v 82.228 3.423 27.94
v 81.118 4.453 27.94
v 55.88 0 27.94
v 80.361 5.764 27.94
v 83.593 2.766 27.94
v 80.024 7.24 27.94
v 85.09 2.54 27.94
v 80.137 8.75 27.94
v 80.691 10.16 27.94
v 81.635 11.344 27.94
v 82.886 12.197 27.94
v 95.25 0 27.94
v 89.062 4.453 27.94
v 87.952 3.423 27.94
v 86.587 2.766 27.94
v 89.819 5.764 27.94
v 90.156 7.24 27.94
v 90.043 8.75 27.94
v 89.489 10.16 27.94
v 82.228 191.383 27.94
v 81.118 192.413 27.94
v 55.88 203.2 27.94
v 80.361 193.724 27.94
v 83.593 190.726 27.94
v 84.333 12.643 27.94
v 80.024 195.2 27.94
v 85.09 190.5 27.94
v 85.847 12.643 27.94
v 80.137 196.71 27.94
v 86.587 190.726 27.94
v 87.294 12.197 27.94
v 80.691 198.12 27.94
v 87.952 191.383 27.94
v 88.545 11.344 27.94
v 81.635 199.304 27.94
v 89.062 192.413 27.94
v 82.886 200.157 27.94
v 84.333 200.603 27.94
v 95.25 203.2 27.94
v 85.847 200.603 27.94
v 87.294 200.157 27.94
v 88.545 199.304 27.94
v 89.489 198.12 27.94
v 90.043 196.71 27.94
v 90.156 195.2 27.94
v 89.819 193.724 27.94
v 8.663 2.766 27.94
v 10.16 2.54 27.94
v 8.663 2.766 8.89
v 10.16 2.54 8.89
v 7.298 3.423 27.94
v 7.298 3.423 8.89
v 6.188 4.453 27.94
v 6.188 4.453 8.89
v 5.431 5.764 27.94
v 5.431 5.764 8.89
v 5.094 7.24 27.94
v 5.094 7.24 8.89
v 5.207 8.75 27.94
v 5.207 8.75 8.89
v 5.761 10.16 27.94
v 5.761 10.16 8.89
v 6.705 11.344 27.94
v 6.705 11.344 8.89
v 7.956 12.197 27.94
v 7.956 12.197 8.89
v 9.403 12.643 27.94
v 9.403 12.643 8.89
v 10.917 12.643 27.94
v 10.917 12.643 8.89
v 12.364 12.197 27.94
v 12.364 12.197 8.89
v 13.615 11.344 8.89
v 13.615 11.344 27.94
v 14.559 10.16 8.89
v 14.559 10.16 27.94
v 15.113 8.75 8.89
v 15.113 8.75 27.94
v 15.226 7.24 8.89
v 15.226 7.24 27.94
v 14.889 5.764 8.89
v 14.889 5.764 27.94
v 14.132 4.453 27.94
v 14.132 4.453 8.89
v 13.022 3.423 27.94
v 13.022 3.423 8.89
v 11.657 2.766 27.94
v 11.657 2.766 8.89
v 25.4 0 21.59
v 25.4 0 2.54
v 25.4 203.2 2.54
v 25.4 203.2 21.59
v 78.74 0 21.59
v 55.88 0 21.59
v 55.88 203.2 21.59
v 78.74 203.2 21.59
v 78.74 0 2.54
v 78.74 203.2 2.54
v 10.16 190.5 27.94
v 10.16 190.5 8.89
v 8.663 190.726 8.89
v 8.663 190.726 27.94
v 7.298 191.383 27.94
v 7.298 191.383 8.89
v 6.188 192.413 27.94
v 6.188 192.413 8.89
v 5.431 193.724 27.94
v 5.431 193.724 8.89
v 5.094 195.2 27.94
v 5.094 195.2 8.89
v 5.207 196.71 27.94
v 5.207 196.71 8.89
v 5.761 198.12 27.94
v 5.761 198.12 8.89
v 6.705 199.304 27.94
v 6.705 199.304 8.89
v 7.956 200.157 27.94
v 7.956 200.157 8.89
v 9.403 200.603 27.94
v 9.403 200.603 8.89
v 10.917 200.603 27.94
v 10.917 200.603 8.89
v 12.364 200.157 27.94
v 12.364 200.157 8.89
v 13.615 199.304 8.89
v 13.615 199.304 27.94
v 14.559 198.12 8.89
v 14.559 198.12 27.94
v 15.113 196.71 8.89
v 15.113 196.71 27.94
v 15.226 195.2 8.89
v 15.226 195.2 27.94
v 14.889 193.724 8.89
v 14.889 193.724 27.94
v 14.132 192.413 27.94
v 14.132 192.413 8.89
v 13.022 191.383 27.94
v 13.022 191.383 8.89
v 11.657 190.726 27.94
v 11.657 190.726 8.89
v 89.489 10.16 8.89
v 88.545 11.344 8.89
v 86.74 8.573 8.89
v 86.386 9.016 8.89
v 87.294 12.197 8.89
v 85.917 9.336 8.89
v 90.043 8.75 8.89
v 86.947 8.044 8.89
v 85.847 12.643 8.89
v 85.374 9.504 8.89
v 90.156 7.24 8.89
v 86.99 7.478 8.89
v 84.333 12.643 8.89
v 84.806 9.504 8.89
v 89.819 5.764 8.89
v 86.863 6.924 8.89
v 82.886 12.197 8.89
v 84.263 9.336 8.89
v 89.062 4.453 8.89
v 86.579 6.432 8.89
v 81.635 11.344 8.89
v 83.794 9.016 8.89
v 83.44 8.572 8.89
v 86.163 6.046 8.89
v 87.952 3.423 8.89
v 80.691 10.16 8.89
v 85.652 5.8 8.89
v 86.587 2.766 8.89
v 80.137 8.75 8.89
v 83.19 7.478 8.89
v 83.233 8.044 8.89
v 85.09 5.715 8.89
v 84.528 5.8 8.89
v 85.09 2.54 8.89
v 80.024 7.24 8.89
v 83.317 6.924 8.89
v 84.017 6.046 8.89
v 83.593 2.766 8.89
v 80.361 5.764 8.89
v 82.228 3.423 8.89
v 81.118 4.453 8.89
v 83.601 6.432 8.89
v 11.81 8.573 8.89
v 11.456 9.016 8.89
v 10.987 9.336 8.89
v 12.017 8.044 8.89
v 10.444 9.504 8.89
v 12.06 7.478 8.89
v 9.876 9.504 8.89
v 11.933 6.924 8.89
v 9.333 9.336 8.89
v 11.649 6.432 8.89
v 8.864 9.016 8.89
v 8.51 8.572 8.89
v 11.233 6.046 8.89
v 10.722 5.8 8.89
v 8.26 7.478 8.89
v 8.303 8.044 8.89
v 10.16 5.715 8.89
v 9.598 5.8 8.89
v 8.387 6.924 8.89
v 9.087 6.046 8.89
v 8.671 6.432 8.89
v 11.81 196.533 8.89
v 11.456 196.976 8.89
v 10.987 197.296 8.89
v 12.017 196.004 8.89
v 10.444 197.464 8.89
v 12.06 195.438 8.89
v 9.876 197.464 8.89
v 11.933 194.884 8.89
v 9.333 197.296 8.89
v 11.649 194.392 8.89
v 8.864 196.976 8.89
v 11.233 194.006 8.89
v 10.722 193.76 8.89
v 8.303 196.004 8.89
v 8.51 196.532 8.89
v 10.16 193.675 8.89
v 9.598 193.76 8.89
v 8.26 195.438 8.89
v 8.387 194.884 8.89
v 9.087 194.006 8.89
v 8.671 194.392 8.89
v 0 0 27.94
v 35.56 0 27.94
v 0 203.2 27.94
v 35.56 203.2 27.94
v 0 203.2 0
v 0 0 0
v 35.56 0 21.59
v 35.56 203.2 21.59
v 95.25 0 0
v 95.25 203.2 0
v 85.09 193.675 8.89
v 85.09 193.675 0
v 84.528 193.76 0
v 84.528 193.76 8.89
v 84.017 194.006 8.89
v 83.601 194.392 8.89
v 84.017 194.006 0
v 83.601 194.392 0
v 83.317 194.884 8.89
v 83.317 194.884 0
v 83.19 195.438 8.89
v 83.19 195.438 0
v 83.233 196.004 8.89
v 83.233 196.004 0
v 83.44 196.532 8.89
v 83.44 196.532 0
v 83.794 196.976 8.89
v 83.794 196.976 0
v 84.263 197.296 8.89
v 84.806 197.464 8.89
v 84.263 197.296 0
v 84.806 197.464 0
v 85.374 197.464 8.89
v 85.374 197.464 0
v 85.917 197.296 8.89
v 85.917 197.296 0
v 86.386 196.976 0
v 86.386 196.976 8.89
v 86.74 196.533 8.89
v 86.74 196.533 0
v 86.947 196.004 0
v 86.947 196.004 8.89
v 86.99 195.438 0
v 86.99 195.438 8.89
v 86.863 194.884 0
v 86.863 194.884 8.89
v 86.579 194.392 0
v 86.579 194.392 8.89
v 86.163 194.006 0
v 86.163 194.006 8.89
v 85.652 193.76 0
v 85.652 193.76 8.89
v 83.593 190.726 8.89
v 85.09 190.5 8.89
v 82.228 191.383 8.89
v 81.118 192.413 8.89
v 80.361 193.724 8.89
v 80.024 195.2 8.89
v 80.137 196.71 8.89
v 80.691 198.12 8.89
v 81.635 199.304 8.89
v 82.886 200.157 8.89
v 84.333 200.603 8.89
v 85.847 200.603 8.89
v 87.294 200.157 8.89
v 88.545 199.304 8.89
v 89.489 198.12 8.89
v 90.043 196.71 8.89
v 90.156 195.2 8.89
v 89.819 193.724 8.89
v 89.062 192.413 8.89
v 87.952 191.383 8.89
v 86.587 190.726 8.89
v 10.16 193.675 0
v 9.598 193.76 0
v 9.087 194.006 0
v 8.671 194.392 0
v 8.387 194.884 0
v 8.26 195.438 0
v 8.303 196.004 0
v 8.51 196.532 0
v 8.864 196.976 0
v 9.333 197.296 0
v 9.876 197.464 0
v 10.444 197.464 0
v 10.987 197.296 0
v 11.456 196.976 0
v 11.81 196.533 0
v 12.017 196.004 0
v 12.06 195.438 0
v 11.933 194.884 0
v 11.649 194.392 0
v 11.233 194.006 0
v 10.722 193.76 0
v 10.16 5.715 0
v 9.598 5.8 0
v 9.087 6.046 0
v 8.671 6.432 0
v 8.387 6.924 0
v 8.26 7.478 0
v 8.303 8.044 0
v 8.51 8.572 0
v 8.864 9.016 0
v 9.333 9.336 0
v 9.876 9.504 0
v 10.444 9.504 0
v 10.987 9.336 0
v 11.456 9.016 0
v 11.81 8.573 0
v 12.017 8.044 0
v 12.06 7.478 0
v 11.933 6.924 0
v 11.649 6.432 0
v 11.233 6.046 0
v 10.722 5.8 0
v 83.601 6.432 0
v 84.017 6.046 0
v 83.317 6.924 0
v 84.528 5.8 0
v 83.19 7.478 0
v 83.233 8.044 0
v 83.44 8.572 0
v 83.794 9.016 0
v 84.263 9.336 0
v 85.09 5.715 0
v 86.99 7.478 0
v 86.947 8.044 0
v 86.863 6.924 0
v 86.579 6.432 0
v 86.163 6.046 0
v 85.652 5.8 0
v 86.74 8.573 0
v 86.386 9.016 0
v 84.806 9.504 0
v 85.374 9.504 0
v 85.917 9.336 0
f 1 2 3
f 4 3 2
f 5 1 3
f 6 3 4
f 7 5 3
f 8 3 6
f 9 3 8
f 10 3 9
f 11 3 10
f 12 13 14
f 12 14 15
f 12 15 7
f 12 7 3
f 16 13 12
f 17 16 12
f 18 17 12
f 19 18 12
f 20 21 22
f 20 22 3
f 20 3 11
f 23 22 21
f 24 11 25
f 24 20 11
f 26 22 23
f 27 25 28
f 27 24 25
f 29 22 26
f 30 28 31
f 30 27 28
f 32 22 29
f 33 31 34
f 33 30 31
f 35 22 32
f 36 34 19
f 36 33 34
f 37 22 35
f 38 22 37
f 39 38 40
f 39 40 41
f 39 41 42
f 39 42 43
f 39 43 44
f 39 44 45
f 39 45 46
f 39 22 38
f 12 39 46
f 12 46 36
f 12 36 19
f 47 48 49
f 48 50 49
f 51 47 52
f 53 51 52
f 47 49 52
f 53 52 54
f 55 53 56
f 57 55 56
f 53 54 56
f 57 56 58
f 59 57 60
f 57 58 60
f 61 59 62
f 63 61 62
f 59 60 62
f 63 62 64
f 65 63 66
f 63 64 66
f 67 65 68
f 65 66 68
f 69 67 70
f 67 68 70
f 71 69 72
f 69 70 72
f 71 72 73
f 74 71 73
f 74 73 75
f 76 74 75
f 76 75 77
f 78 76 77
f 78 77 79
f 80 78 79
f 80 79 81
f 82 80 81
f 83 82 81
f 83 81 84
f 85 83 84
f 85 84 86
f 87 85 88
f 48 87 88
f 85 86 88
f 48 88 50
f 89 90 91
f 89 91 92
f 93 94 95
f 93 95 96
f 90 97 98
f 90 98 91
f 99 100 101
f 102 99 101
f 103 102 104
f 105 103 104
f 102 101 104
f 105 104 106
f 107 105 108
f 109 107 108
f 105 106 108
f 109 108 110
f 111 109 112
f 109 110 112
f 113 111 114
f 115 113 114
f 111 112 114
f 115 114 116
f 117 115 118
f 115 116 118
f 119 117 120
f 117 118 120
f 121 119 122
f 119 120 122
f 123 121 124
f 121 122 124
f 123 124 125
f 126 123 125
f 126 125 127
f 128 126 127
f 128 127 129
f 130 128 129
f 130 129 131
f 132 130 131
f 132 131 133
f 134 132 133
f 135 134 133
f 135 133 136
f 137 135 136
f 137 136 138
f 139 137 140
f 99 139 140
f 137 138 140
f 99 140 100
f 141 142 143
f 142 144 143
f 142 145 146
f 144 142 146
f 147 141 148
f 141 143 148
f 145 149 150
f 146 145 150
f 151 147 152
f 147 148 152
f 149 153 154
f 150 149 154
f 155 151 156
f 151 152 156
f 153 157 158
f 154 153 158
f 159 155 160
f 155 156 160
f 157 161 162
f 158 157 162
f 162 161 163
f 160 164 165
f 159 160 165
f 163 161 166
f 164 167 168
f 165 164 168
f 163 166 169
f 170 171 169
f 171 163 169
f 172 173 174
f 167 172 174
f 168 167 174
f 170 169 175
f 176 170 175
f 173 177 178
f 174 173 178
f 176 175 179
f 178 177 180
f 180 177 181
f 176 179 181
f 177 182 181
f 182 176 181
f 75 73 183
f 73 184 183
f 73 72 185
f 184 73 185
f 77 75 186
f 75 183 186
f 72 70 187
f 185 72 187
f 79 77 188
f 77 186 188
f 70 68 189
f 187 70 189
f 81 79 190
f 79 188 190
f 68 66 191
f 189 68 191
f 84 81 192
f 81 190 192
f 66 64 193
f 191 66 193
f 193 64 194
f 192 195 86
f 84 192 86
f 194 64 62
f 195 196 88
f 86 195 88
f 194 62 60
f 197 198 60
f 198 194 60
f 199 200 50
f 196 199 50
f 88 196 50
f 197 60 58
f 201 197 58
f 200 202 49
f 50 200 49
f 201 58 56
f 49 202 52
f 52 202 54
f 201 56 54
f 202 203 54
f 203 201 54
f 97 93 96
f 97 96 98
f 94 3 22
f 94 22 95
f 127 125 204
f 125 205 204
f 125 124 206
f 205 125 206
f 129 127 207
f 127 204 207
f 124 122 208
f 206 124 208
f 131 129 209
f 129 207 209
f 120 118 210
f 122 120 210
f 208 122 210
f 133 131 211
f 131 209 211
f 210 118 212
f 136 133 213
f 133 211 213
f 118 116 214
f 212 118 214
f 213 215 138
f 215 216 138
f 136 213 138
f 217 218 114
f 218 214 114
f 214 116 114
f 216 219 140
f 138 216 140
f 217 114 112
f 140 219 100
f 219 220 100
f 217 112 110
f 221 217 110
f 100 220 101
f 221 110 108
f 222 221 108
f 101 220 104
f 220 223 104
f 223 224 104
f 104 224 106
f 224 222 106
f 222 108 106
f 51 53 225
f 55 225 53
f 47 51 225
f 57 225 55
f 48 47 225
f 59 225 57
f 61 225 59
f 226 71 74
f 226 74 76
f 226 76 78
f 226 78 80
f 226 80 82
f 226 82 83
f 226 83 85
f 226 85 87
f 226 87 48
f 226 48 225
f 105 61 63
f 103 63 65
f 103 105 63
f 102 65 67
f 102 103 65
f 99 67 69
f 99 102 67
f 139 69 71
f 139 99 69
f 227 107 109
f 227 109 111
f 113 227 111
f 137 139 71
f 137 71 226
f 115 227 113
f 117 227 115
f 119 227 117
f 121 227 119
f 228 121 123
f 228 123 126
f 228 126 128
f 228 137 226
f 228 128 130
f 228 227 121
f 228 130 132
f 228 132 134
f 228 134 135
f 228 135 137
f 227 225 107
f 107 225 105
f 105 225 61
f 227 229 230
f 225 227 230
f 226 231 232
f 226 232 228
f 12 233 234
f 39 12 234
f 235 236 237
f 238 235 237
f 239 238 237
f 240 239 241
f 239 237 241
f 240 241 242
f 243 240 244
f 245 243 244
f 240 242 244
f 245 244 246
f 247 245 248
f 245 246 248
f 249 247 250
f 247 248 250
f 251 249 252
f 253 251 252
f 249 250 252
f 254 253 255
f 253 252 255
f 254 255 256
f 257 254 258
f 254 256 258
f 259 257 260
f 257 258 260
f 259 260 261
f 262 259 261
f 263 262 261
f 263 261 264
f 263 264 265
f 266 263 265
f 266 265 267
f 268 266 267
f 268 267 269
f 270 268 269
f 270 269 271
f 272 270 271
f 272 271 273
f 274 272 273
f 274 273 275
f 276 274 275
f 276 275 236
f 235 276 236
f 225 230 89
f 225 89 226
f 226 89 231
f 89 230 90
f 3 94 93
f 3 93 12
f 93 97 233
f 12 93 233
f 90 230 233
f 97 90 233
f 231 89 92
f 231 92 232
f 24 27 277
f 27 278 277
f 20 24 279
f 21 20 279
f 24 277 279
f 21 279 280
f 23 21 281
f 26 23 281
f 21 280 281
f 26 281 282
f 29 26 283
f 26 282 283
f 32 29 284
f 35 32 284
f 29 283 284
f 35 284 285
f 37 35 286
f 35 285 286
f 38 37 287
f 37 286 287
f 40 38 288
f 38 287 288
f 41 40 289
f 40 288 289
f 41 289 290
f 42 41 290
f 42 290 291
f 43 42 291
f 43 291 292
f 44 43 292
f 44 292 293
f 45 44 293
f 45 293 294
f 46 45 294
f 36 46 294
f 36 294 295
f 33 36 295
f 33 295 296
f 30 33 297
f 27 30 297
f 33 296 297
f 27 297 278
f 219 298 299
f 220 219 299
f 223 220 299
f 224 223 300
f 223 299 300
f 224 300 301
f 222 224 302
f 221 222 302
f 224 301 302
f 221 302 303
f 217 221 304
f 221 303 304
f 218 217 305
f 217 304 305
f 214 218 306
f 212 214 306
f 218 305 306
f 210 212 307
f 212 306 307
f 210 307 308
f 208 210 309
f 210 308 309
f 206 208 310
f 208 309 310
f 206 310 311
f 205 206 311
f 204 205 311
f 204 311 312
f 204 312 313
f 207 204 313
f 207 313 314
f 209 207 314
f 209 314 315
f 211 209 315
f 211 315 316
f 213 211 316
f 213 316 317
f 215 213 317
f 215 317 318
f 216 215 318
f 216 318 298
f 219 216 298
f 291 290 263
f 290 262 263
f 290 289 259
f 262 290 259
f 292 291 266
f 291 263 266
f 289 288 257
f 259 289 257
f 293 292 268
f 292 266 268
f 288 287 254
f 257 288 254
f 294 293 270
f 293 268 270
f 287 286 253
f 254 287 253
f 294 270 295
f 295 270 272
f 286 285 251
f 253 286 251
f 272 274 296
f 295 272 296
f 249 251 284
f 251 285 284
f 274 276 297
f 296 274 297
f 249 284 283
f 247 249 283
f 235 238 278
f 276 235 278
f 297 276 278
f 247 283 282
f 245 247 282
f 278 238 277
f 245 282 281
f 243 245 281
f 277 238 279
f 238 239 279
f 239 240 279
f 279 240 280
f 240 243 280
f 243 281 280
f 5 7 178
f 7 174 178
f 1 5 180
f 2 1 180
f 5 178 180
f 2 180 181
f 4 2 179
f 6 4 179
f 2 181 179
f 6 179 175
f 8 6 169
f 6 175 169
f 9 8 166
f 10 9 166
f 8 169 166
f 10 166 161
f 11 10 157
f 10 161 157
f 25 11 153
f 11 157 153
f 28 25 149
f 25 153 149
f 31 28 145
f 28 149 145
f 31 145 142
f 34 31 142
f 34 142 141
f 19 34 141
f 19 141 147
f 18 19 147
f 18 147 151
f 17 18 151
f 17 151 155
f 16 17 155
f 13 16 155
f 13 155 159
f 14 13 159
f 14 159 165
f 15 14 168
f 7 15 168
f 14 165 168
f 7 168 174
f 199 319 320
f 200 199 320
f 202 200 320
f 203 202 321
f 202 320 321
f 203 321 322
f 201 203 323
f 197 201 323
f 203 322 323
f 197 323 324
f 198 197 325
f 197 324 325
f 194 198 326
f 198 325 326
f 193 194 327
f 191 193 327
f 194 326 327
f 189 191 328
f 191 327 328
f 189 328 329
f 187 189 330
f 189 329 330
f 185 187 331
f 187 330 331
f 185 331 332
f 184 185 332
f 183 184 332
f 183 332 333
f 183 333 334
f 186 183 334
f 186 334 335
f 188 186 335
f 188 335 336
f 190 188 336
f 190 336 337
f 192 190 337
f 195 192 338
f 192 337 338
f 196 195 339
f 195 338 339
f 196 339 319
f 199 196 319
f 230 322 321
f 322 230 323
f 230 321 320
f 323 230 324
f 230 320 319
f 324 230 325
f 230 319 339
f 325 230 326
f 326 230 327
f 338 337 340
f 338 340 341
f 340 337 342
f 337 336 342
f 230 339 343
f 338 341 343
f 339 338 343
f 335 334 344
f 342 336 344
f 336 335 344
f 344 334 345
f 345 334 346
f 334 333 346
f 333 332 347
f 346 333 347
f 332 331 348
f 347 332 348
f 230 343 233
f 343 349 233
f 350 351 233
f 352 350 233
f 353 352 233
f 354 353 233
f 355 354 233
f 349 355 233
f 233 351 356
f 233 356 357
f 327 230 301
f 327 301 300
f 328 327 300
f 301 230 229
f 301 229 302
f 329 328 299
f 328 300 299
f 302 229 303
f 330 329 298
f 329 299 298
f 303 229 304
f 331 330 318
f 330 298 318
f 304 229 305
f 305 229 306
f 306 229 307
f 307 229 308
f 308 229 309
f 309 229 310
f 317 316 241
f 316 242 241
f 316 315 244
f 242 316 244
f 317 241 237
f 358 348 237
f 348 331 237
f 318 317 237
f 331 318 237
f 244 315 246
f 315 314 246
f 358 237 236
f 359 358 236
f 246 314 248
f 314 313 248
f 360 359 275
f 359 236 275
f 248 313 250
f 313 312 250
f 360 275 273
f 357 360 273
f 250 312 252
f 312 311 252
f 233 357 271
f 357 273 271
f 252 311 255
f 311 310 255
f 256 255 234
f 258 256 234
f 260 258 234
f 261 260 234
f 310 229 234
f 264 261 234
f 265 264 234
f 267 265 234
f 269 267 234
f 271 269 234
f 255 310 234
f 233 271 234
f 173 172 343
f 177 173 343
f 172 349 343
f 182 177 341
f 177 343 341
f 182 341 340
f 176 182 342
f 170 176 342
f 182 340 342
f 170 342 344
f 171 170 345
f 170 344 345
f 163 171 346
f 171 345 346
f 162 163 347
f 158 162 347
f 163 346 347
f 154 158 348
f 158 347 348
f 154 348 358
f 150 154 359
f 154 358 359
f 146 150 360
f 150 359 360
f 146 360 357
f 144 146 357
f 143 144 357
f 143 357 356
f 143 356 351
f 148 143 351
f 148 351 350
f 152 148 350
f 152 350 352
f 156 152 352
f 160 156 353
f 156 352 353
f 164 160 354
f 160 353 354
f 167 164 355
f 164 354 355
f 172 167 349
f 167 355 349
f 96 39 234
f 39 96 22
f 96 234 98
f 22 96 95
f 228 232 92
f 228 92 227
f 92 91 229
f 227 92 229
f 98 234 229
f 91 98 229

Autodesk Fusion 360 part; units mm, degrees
sketch "Sketch1" plane through (0, 0, 0) normal (0, 0, 1) x (1, 0, 0)
  line L0 (0, 0) -> (95.25, 0)
  line L1 (95.25, 0) -> (95.25, 203.2)
  line L2 (95.25, 203.2) -> (0, 203.2)
  line L3 (0, 203.2) -> (0, 0)
  dimension "d1" = 95.25
  dimension "d2" = 203.2
extrude "Extrude1" add sketch "Sketch1" along normal blind 27.94
sketch "Sketch3" plane through (0, 0, 0) normal (0, -1, 0) x (1, 0, 0)
  line L0 (0, 0) -> (95.25, 0)
  line L1 (95.25, 0) -> (95.25, 27.94)
  line L2 (95.25, 27.94) -> (0, 27.94)
  line L3 (0, 27.94) -> (0, 0)
  line L4 (95.25, 27.94) -> (49.53, 27.94)
  line L5 (35.56, 27.94) -> (55.88, 27.94)
  line L6 (55.88, 27.94) -> (55.88, 15.24)
  line L7 (55.88, 15.24) -> (35.56, 15.24)
  line L8 (35.56, 15.24) -> (35.56, 27.94)
  line L9 (95.25, 19.05) -> (59.69, 19.05)
  line L10 (0, 21.59) -> (25.4, 21.59)
  line L11 (25.4, 21.59) -> (78.74, 21.59)
  line L12 (78.74, 21.59) -> (78.74, 2.54)
  line L13 (78.74, 2.54) -> (25.4, 2.54)
  line L14 (25.4, 2.54) -> (25.4, 21.59)
  dimension "d21" = 45.72
  dimension "d22" = 12.7
  dimension "d29" = 53.34
  dimension "d30" = 20.32
  dimension "d55" = 19.05
  dimension "d56" = 2.54
  dimension "d57" = 15.24
  dimension "d58" = 35.56
  dimension "d59" = 25.4
extrude "Extrude3" cut sketch "Sketch3" against normal blind 241.3 contours L6 L7 L8 L11 L12 L13 L14 | L2 L4 L5 L6 L8 L11 | L6 L7 L8 L11
sketch "Sketch5" plane through (0, 0, 27.94) normal (0, 0, 1) x (-1, 0, 0)
  line L0 (-35.56, -203.2) -> (0, -203.2)
  line L1 (0, -203.2) -> (0, 0)
  line L2 (0, 0) -> (-35.56, 0)
  circle A0 centre (-10.16, -7.62) radius 2.54
  circle A1 centre (-10.16, -195.58) radius 2.54
  line L3 (-35.56, 0) -> (-35.56, -203.2)
  dimension "d31" = 5.08
  dimension "d32" = 7.62
  dimension "d33" = 5.08
  dimension "d34" = 10.16
  dimension "d35" = 7.62
  dimension "d41" = 10.16
hole "Hole1" at (10.16, 195.58, 27.94) at (10.16, 7.62, 27.94) direction (0, 0, -1) diameter 3.81 depth 48.26 tip angle 118 counterbore diameter 10.16 counterbore depth 19.05
sketch "Sketch6" plane through (0, 0, 27.94) normal (0, 0, 1) x (-1, 0, 0)
  line L0 (-55.88, 0) -> (-95.25, 0)
  line L1 (-95.25, 0) -> (-95.25, -203.2)
  line L2 (-95.25, -203.2) -> (-55.88, -203.2)
  circle A0 centre (-85.09, -7.62) radius 2.54
  circle A1 centre (-85.09, -195.58) radius 2.54
  line L3 (-55.88, -203.2) -> (-55.88, 0)
  dimension "d42" = 5.08
  dimension "d43" = 10.16
  dimension "d44" = 7.62
  dimension "d45" = 5.08
  dimension "d46" = 7.62
  dimension "d47" = 10.16
hole "Hole2" at (85.09, 7.62, 27.94) at (85.09, 195.58, 27.94) direction (0, 0, -1) diameter 3.81 depth 45.72 tip angle 118 counterbore diameter 10.16 counterbore depth 19.05
